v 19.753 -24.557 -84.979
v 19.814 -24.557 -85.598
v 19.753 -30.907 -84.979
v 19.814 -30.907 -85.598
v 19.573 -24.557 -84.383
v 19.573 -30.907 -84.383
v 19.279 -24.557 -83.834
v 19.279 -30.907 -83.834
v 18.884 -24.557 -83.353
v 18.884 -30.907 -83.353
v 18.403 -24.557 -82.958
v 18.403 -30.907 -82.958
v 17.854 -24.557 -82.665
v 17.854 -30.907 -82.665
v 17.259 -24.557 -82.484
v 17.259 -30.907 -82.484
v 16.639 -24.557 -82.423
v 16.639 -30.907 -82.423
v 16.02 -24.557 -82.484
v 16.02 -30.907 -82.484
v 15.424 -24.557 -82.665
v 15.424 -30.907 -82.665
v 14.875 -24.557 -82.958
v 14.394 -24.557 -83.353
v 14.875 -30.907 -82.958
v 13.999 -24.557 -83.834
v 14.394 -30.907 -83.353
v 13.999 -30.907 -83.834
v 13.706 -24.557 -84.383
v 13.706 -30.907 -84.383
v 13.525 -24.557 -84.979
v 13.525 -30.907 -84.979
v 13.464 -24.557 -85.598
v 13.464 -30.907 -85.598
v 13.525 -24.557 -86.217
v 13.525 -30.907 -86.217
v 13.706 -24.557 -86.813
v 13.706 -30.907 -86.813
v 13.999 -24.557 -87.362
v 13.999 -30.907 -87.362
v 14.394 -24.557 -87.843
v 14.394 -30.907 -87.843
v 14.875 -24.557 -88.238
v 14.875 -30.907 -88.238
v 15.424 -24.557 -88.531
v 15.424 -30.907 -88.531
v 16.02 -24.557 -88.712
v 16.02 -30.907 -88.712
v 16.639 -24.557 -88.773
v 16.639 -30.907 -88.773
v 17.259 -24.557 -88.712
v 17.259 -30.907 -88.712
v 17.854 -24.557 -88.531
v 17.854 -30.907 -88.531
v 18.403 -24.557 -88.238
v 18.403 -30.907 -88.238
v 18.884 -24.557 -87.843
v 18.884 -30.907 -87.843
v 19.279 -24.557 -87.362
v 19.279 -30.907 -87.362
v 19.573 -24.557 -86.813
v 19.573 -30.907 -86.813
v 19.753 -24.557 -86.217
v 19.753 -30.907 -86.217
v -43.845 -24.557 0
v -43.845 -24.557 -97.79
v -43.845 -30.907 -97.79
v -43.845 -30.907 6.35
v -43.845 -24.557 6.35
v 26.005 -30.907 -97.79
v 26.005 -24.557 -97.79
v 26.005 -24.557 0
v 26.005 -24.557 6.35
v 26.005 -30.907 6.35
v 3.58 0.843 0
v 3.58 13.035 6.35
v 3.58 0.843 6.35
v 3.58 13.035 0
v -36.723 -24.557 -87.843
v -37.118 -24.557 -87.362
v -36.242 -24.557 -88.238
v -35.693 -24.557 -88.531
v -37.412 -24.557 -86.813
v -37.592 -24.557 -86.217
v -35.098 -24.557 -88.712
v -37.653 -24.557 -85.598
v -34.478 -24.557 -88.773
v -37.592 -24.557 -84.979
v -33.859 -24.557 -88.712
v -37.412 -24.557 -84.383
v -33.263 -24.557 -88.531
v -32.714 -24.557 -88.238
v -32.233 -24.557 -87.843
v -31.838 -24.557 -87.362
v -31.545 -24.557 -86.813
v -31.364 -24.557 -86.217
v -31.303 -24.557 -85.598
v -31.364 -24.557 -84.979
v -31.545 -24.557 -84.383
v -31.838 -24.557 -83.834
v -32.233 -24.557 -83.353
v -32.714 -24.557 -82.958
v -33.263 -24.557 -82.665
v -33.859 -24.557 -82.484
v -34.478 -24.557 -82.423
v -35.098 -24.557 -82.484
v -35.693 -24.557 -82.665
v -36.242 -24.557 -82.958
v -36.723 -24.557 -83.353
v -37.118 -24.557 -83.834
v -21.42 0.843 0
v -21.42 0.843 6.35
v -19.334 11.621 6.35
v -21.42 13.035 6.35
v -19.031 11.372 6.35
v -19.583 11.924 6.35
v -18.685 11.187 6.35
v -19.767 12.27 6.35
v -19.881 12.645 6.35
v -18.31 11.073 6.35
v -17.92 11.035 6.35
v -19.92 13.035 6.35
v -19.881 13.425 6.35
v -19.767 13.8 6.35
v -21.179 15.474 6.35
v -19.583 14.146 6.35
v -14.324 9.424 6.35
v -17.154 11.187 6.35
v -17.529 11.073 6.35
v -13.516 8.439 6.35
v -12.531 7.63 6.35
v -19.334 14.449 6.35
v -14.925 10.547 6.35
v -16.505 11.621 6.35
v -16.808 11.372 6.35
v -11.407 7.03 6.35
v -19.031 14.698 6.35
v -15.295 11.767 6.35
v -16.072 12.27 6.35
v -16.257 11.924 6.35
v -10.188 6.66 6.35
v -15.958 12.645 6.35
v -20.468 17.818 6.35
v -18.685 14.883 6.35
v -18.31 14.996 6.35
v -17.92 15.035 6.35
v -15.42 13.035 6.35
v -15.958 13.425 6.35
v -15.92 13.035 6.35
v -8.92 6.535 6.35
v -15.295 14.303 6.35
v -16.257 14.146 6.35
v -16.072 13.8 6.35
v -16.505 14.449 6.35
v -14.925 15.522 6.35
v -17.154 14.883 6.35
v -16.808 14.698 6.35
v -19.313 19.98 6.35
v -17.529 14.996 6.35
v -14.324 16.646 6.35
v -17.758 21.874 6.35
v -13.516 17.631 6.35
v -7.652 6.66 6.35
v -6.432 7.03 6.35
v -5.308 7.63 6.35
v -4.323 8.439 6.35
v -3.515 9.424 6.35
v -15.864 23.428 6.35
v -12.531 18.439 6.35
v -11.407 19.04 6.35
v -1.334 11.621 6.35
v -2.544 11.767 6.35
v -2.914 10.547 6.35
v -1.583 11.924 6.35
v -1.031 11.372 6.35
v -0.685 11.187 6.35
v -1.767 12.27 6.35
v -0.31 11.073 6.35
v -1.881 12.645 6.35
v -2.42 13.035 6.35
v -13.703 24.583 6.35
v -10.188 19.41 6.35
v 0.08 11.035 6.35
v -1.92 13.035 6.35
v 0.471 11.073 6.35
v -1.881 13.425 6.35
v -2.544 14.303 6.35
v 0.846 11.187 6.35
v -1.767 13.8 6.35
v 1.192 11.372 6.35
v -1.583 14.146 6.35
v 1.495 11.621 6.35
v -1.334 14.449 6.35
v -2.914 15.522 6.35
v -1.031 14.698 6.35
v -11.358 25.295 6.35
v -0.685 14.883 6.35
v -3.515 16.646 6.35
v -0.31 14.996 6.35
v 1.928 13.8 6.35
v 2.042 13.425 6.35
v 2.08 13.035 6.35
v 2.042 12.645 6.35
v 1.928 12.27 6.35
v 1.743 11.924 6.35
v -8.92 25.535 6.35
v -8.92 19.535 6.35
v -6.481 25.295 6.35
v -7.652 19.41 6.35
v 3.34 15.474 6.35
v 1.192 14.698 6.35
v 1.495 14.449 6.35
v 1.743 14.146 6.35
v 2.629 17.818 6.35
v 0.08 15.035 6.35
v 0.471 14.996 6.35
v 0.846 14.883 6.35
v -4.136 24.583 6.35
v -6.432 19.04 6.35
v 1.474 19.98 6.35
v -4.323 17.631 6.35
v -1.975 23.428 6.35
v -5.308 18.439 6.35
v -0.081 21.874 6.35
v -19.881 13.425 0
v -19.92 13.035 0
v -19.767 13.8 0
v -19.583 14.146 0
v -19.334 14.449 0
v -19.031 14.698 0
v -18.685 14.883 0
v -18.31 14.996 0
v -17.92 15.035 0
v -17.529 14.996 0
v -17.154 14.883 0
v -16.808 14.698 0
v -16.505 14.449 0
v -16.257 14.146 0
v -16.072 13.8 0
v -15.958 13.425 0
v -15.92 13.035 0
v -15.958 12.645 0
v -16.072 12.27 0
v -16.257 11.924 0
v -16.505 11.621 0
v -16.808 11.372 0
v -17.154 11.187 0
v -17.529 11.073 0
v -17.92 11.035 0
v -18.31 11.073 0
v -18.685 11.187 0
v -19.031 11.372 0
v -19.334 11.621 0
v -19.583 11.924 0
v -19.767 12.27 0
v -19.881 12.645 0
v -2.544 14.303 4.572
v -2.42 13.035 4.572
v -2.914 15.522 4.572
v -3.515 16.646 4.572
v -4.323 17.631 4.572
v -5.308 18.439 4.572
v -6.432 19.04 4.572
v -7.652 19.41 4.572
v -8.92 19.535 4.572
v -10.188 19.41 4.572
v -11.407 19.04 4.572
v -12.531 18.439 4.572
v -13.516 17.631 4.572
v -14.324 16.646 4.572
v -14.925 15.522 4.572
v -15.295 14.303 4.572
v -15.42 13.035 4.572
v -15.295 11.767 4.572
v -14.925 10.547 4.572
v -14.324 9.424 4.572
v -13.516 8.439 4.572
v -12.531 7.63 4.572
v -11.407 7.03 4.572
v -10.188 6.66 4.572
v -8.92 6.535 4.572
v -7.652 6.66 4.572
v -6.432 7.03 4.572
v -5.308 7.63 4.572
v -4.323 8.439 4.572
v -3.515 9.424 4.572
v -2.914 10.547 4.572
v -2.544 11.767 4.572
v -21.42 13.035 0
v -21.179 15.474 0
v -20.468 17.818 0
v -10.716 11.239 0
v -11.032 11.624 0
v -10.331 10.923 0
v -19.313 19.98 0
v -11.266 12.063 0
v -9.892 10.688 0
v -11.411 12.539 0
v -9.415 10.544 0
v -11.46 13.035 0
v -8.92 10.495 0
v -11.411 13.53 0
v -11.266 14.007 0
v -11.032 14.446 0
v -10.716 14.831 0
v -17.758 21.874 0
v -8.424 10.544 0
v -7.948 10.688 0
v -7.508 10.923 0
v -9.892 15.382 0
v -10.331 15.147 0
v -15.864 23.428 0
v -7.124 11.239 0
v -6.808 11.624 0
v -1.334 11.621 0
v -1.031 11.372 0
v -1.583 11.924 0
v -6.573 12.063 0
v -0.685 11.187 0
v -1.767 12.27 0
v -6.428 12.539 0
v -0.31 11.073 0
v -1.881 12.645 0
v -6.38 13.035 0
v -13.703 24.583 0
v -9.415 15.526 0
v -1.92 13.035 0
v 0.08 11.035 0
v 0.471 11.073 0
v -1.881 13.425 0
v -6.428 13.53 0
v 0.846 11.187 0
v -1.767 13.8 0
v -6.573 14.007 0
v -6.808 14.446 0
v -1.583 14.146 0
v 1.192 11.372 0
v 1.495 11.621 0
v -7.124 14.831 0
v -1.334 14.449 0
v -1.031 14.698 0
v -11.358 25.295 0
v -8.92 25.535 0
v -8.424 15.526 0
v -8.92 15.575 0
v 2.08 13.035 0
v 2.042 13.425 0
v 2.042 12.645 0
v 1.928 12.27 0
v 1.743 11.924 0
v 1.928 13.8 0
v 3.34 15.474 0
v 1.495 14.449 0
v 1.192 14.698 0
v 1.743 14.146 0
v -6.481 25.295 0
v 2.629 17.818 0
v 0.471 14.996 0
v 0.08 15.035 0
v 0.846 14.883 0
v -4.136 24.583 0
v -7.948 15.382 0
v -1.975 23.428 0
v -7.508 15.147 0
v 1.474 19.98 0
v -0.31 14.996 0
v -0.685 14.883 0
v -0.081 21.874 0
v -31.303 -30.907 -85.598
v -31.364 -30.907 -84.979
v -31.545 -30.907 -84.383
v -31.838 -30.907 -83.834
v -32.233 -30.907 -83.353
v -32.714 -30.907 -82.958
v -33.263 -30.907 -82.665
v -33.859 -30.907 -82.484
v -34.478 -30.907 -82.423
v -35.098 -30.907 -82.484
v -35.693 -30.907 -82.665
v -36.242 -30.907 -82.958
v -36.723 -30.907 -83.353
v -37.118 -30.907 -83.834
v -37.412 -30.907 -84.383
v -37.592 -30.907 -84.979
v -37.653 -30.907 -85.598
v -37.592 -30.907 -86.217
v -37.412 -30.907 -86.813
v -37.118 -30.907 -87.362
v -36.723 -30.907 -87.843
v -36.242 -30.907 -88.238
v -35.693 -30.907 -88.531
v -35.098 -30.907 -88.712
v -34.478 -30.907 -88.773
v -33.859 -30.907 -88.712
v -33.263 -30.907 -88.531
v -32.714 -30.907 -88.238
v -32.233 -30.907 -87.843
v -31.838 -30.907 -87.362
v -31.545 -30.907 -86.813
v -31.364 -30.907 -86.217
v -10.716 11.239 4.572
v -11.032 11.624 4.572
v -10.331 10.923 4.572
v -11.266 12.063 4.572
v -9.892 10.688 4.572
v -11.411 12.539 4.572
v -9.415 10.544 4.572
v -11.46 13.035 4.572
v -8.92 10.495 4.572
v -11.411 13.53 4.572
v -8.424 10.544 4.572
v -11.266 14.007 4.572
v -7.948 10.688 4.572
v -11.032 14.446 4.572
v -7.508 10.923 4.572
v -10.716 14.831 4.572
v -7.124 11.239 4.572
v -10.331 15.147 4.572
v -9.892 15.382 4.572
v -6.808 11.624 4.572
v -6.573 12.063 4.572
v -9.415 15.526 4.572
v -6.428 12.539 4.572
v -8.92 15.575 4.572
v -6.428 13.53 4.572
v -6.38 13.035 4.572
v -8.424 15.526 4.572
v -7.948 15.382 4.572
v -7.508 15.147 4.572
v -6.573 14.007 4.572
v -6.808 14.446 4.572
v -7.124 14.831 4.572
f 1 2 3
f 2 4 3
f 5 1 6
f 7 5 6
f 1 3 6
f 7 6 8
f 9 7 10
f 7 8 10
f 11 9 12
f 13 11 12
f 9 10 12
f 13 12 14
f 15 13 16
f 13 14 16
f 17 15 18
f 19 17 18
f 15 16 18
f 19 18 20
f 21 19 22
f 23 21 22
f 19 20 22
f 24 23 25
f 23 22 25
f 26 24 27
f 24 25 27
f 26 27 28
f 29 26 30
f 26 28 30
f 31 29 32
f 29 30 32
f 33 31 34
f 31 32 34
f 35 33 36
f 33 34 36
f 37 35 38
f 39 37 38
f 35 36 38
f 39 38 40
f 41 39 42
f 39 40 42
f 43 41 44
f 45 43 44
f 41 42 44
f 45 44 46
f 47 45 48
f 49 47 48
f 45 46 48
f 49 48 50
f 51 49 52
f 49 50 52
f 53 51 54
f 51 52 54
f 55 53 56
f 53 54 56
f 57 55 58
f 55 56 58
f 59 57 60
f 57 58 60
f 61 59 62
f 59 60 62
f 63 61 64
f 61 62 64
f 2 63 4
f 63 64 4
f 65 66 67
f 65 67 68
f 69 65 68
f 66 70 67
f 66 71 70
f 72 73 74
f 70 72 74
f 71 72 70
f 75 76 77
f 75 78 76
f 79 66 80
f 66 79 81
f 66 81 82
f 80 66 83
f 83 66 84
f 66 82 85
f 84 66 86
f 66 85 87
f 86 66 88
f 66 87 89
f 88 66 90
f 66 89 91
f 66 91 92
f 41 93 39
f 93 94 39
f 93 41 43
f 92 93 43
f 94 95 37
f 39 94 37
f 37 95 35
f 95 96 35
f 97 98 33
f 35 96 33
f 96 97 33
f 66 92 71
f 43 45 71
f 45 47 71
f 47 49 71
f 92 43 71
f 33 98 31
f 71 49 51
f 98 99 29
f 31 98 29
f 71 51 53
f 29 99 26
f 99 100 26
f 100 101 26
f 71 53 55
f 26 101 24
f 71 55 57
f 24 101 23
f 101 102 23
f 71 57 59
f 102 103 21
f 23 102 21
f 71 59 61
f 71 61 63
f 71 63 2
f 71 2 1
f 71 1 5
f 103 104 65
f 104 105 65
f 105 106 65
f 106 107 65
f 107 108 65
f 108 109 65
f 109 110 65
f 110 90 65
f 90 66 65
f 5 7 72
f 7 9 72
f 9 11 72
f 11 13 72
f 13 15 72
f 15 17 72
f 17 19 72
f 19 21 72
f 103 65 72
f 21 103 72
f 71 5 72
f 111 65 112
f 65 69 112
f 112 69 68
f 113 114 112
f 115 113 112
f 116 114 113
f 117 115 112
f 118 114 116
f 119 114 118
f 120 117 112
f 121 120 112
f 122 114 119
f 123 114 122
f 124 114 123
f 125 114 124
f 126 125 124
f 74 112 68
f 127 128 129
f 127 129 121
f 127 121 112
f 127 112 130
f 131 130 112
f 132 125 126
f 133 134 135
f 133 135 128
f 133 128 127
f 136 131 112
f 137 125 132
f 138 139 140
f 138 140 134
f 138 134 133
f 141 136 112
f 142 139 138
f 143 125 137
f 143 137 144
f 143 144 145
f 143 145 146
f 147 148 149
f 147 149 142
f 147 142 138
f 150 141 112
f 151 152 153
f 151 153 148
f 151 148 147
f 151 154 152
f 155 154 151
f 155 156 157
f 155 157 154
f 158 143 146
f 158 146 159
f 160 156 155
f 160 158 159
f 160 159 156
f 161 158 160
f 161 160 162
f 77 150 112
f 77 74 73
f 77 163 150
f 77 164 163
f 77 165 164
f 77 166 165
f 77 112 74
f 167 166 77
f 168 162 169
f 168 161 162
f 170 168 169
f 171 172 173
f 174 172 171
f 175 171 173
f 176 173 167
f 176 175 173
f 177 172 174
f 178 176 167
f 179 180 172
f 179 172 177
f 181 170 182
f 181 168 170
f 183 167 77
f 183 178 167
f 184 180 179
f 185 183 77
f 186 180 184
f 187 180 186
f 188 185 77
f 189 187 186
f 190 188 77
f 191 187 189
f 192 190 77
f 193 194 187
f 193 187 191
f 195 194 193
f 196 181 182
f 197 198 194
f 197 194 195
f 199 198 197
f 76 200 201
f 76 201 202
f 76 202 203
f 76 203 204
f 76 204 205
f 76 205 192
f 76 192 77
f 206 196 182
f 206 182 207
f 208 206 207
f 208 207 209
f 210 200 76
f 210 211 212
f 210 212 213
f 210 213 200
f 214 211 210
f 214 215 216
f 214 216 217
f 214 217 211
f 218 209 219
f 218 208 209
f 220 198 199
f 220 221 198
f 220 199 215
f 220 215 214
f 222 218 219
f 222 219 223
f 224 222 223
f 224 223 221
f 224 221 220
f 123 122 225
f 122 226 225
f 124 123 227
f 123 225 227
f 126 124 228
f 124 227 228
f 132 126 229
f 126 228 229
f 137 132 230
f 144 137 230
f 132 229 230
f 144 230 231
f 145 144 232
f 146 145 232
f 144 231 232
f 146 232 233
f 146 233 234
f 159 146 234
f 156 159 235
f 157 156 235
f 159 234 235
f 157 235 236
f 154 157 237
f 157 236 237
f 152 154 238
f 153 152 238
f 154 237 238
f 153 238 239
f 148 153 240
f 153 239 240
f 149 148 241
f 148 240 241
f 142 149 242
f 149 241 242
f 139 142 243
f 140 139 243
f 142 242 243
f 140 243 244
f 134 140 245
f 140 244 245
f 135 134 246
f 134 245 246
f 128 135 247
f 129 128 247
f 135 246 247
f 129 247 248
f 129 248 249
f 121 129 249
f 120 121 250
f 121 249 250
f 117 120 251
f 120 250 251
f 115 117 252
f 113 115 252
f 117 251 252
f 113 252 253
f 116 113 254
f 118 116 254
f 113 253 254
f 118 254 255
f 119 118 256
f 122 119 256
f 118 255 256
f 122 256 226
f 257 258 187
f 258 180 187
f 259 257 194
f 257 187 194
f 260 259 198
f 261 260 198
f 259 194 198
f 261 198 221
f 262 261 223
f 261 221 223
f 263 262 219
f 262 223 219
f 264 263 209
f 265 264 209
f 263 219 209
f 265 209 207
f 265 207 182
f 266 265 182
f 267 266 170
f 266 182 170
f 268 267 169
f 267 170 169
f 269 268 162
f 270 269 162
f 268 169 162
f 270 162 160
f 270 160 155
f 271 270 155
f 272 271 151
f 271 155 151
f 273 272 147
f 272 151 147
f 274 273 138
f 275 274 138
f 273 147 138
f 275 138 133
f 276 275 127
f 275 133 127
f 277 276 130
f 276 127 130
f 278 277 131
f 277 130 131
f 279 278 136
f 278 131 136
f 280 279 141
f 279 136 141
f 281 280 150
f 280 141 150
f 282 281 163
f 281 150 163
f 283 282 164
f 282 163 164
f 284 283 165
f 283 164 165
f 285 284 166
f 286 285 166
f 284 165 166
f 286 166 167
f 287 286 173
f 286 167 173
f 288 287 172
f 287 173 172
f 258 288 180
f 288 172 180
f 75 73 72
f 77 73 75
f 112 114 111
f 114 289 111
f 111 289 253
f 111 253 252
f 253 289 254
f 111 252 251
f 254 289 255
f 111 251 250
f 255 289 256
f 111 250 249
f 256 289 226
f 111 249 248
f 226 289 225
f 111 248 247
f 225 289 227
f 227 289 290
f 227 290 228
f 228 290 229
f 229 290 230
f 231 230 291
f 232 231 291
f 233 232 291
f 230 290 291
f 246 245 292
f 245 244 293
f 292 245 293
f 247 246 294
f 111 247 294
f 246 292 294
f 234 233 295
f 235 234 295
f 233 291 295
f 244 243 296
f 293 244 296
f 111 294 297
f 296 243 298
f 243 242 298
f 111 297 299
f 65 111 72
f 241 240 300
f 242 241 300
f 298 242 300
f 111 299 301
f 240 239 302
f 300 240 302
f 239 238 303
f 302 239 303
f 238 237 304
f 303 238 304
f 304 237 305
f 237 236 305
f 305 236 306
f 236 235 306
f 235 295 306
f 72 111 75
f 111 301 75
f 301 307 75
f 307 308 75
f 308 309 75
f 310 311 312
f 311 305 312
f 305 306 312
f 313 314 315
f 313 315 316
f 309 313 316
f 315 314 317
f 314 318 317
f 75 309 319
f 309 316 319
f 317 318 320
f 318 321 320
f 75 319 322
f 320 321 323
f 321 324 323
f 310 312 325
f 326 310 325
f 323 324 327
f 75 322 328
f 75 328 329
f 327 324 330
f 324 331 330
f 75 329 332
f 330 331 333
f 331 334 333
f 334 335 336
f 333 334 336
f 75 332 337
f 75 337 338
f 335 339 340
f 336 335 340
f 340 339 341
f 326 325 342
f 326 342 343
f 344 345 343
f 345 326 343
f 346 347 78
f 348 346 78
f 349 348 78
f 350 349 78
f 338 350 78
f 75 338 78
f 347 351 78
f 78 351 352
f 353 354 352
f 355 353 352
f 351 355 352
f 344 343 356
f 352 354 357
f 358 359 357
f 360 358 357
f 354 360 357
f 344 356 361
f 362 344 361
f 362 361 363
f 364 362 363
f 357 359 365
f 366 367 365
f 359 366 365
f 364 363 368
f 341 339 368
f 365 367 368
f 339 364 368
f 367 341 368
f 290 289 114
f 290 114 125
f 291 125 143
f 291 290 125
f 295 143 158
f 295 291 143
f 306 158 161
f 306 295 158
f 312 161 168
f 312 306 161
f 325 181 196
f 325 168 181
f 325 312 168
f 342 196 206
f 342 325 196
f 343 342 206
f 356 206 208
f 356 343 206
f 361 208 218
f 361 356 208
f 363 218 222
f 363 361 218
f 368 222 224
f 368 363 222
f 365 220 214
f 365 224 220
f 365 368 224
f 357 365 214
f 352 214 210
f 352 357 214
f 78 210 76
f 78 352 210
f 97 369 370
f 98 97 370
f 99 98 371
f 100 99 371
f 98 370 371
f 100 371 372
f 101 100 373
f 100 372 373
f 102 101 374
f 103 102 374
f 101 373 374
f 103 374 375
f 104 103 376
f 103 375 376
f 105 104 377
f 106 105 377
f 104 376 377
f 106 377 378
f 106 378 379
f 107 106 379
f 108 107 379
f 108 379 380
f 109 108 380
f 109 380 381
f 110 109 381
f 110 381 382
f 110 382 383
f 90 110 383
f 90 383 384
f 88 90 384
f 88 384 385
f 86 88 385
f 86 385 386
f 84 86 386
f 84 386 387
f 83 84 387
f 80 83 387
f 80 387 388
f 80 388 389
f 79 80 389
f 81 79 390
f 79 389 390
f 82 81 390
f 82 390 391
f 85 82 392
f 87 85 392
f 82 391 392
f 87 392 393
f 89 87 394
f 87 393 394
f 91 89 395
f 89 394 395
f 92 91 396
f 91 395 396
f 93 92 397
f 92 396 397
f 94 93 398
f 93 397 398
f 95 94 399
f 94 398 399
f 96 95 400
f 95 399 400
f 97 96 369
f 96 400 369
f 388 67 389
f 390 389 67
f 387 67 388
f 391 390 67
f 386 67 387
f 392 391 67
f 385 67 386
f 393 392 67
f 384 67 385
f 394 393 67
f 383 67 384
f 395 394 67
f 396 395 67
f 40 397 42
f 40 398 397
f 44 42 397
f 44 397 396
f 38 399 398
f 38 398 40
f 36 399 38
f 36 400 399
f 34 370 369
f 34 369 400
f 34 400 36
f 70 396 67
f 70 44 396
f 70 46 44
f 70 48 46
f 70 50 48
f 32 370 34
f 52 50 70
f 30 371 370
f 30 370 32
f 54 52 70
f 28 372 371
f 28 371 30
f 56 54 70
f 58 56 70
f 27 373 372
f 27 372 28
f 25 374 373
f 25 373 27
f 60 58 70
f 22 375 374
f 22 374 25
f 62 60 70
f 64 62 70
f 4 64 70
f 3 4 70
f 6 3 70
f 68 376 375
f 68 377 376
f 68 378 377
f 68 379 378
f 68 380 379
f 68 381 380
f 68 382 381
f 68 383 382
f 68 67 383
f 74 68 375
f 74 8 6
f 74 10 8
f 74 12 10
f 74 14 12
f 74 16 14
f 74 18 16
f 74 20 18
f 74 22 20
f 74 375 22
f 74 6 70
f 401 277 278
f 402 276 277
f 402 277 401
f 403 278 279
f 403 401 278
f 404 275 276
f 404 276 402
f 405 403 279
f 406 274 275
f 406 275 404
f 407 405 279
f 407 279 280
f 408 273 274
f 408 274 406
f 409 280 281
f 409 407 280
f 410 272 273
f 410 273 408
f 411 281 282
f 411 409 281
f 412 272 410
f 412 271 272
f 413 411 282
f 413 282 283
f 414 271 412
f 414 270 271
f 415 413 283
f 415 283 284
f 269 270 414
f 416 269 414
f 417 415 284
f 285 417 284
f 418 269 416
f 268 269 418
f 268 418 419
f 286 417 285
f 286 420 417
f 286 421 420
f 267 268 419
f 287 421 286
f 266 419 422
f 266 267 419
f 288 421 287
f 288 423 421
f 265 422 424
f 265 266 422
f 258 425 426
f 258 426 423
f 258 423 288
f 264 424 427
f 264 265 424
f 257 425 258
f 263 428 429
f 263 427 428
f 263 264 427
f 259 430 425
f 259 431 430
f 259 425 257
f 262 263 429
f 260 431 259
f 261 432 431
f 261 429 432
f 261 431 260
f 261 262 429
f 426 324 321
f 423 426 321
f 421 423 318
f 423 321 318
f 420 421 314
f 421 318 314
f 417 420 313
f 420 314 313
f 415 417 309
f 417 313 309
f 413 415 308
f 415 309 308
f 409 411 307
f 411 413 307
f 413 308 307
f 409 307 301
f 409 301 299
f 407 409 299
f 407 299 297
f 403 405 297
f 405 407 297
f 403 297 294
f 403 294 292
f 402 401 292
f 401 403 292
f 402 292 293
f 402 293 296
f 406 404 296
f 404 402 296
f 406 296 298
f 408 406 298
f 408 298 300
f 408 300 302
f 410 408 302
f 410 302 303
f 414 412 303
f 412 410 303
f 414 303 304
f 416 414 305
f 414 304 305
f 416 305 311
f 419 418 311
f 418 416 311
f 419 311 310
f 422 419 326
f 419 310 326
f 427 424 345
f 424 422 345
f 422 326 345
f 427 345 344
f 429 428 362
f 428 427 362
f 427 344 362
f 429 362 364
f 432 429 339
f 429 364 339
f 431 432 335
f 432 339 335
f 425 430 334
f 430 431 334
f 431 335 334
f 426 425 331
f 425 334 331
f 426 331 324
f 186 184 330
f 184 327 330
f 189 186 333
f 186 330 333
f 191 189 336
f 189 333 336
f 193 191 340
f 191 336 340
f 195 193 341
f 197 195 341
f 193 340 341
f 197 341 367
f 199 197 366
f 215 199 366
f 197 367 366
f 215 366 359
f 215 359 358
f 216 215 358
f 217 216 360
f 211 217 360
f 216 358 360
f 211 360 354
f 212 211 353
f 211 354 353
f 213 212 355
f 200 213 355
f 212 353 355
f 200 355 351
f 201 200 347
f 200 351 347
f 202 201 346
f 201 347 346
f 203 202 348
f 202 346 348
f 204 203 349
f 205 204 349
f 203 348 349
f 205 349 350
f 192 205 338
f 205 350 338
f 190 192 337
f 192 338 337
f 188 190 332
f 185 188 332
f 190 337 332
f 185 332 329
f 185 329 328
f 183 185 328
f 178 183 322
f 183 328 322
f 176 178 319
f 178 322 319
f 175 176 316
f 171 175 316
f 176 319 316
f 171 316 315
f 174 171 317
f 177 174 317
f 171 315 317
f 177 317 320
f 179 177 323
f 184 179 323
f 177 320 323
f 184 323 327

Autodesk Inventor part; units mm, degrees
ref_plane "YZ Plane" through (0, 0, 0) normal (1, 0, 0) x (0, 1, 0)
ref_plane "XZ Plane" through (0, 0, 0) normal (0, 1, 0) x (-1, 0, 0)
ref_plane "XY Plane" through (0, 0, 0) normal (0, 0, 1) x (1, 0, 0)
sketch "Sketch1" plane through (0, 0, 0) normal (0, 0, 1) x (1, 0, 0)
  arc A0 (3.5804, 13.0349) -> (-21.4196, 13.0349) centre (-8.9196, 13.0349) ccw
  line L0 (-21.4196, 13.0349) -> (-21.4196, -24.5571)
  line L1 (-21.4196, -24.5571) -> (3.5804, -24.5571)
  line L2 (3.5804, 13.0349) -> (3.5804, -24.5571)
  circle A1 centre (-8.9196, 13.0349) radius 2.54
  point P0 (0, 0)
  dimension "d10" = 5.08
  dimension "d11" = 12.5
  dimension "d12" = 37.592
extrude "Extrusion1" add sketch "Sketch1" along normal blind 6.35
sketch "Sketch2" plane through (0, 0, 6.35) normal (0, 0, 1) x (1, 0, 0)
  circle A0 centre (-8.9196, 13.0349) radius 2.54 projected
  circle A1 centre (-8.9196, 13.0349) radius 6.5
  point P0 (0, 0)
  dimension "d9" = 13
extrude "Extrusion2" cut sketch "Sketch2" against normal blind 1.778
sketch "Sketch4" plane through (-21.4196, -24.5571, 0) normal (0, -1, 0) x (1, 0, 0)
  line L0 (-22.425, 6.35) -> (47.425, 6.35)
  line L1 (47.425, 6.35) -> (47.425, -97.79)
  line L2 (47.425, -97.79) -> (-22.425, -97.79)
  line L3 (-22.425, -97.79) -> (-22.425, 6.35)
  line L4 (0, 0) -> (0, 6.35) projected
  line L5 (0, 6.35) -> (0, -15.1092)
  line L6 (12.5, -94.4689) -> (12.5, -35.8122)
  line L7 (0, 6.35) -> (25, 6.35) projected
  point P0 (21.4196, 0)
  dimension "d15" = 12.5
  dimension "d16" = 69.85
  dimension "d17" = 104.14
extrude "Extrusion5" add sketch "Sketch4" along normal blind 6.35
sketch "Sketch5" plane through (0, 0, 6.35) normal (0, 0, 1) x (1, 0, 0)
  line L0 (-43.8446, -24.5571) -> (-43.8446, -30.9071) projected
  line L1 (-21.4196, -24.5571) -> (-43.8446, -24.5571) projected
  line L2 (-43.8446, -24.5571) -> (-21.4196, -24.5571)
  line L3 (-21.4196, -24.5571) -> (-21.4196, 0.8429)
  line L4 (-21.4196, 13.0349) -> (-21.4196, -24.5571) projected
  line L5 (-43.8446, -24.5571) -> (-21.4196, 0.8429)
  line L6 (26.0054, -24.5571) -> (3.5804, -24.5571) projected
  line L7 (26.0054, -24.5571) -> (3.5804, 0.8429)
  line L8 (3.5804, 0.8429) -> (3.5804, -24.5571)
  line L9 (3.5804, -24.5571) -> (26.0054, -24.5571)
  point P0 (0, 0)
  dimension "d20" = 25.4
  dimension "d21" = 25.4
extrude "Extrusion6" add sketch "Sketch5" against normal blind 6.35
sketch "Sketch6" plane through (0, 0, 0) normal (0, 0, -1) x (-1, 0, 0)
  circle A0 centre (8.9196, 13.0349) radius 2.54 projected
  line L0 (8.9196, 13.0349) -> (8.9196, 0.8013)
  circle A1 centre (17.9196, 13.0349) radius 2
  circle A2 centre (-0.0804, 13.0349) radius 2
  point P0 (0, 0)
  dimension "d24" = 18
  dimension "d25" = 4
extrude "Extrusion7" cut sketch "Sketch6" against normal through all contours A1 | A2
sketch "Sketch7" plane through (-21.4196, -30.9071, 0) normal (0, -1, 0) x (1, 0, 0)
  circle A0 centre (-13.0588, -85.598) radius 3.175
  line L0 (12.5, -78.7871) -> (12.5, -99.3381)
  circle A1 centre (38.0588, -85.598) radius 3.175
  line L1 (47.425, 6.35) -> (-22.425, 6.35) projected
  point P0 (21.4196, 0)
  dimension "d28" = 6.35
  dimension "d29" = 51.1175
  dimension "d30" = 91.948
extrude "Extrusion8" cut sketch "Sketch7" against normal through all
properties part number "encoder_mount"
